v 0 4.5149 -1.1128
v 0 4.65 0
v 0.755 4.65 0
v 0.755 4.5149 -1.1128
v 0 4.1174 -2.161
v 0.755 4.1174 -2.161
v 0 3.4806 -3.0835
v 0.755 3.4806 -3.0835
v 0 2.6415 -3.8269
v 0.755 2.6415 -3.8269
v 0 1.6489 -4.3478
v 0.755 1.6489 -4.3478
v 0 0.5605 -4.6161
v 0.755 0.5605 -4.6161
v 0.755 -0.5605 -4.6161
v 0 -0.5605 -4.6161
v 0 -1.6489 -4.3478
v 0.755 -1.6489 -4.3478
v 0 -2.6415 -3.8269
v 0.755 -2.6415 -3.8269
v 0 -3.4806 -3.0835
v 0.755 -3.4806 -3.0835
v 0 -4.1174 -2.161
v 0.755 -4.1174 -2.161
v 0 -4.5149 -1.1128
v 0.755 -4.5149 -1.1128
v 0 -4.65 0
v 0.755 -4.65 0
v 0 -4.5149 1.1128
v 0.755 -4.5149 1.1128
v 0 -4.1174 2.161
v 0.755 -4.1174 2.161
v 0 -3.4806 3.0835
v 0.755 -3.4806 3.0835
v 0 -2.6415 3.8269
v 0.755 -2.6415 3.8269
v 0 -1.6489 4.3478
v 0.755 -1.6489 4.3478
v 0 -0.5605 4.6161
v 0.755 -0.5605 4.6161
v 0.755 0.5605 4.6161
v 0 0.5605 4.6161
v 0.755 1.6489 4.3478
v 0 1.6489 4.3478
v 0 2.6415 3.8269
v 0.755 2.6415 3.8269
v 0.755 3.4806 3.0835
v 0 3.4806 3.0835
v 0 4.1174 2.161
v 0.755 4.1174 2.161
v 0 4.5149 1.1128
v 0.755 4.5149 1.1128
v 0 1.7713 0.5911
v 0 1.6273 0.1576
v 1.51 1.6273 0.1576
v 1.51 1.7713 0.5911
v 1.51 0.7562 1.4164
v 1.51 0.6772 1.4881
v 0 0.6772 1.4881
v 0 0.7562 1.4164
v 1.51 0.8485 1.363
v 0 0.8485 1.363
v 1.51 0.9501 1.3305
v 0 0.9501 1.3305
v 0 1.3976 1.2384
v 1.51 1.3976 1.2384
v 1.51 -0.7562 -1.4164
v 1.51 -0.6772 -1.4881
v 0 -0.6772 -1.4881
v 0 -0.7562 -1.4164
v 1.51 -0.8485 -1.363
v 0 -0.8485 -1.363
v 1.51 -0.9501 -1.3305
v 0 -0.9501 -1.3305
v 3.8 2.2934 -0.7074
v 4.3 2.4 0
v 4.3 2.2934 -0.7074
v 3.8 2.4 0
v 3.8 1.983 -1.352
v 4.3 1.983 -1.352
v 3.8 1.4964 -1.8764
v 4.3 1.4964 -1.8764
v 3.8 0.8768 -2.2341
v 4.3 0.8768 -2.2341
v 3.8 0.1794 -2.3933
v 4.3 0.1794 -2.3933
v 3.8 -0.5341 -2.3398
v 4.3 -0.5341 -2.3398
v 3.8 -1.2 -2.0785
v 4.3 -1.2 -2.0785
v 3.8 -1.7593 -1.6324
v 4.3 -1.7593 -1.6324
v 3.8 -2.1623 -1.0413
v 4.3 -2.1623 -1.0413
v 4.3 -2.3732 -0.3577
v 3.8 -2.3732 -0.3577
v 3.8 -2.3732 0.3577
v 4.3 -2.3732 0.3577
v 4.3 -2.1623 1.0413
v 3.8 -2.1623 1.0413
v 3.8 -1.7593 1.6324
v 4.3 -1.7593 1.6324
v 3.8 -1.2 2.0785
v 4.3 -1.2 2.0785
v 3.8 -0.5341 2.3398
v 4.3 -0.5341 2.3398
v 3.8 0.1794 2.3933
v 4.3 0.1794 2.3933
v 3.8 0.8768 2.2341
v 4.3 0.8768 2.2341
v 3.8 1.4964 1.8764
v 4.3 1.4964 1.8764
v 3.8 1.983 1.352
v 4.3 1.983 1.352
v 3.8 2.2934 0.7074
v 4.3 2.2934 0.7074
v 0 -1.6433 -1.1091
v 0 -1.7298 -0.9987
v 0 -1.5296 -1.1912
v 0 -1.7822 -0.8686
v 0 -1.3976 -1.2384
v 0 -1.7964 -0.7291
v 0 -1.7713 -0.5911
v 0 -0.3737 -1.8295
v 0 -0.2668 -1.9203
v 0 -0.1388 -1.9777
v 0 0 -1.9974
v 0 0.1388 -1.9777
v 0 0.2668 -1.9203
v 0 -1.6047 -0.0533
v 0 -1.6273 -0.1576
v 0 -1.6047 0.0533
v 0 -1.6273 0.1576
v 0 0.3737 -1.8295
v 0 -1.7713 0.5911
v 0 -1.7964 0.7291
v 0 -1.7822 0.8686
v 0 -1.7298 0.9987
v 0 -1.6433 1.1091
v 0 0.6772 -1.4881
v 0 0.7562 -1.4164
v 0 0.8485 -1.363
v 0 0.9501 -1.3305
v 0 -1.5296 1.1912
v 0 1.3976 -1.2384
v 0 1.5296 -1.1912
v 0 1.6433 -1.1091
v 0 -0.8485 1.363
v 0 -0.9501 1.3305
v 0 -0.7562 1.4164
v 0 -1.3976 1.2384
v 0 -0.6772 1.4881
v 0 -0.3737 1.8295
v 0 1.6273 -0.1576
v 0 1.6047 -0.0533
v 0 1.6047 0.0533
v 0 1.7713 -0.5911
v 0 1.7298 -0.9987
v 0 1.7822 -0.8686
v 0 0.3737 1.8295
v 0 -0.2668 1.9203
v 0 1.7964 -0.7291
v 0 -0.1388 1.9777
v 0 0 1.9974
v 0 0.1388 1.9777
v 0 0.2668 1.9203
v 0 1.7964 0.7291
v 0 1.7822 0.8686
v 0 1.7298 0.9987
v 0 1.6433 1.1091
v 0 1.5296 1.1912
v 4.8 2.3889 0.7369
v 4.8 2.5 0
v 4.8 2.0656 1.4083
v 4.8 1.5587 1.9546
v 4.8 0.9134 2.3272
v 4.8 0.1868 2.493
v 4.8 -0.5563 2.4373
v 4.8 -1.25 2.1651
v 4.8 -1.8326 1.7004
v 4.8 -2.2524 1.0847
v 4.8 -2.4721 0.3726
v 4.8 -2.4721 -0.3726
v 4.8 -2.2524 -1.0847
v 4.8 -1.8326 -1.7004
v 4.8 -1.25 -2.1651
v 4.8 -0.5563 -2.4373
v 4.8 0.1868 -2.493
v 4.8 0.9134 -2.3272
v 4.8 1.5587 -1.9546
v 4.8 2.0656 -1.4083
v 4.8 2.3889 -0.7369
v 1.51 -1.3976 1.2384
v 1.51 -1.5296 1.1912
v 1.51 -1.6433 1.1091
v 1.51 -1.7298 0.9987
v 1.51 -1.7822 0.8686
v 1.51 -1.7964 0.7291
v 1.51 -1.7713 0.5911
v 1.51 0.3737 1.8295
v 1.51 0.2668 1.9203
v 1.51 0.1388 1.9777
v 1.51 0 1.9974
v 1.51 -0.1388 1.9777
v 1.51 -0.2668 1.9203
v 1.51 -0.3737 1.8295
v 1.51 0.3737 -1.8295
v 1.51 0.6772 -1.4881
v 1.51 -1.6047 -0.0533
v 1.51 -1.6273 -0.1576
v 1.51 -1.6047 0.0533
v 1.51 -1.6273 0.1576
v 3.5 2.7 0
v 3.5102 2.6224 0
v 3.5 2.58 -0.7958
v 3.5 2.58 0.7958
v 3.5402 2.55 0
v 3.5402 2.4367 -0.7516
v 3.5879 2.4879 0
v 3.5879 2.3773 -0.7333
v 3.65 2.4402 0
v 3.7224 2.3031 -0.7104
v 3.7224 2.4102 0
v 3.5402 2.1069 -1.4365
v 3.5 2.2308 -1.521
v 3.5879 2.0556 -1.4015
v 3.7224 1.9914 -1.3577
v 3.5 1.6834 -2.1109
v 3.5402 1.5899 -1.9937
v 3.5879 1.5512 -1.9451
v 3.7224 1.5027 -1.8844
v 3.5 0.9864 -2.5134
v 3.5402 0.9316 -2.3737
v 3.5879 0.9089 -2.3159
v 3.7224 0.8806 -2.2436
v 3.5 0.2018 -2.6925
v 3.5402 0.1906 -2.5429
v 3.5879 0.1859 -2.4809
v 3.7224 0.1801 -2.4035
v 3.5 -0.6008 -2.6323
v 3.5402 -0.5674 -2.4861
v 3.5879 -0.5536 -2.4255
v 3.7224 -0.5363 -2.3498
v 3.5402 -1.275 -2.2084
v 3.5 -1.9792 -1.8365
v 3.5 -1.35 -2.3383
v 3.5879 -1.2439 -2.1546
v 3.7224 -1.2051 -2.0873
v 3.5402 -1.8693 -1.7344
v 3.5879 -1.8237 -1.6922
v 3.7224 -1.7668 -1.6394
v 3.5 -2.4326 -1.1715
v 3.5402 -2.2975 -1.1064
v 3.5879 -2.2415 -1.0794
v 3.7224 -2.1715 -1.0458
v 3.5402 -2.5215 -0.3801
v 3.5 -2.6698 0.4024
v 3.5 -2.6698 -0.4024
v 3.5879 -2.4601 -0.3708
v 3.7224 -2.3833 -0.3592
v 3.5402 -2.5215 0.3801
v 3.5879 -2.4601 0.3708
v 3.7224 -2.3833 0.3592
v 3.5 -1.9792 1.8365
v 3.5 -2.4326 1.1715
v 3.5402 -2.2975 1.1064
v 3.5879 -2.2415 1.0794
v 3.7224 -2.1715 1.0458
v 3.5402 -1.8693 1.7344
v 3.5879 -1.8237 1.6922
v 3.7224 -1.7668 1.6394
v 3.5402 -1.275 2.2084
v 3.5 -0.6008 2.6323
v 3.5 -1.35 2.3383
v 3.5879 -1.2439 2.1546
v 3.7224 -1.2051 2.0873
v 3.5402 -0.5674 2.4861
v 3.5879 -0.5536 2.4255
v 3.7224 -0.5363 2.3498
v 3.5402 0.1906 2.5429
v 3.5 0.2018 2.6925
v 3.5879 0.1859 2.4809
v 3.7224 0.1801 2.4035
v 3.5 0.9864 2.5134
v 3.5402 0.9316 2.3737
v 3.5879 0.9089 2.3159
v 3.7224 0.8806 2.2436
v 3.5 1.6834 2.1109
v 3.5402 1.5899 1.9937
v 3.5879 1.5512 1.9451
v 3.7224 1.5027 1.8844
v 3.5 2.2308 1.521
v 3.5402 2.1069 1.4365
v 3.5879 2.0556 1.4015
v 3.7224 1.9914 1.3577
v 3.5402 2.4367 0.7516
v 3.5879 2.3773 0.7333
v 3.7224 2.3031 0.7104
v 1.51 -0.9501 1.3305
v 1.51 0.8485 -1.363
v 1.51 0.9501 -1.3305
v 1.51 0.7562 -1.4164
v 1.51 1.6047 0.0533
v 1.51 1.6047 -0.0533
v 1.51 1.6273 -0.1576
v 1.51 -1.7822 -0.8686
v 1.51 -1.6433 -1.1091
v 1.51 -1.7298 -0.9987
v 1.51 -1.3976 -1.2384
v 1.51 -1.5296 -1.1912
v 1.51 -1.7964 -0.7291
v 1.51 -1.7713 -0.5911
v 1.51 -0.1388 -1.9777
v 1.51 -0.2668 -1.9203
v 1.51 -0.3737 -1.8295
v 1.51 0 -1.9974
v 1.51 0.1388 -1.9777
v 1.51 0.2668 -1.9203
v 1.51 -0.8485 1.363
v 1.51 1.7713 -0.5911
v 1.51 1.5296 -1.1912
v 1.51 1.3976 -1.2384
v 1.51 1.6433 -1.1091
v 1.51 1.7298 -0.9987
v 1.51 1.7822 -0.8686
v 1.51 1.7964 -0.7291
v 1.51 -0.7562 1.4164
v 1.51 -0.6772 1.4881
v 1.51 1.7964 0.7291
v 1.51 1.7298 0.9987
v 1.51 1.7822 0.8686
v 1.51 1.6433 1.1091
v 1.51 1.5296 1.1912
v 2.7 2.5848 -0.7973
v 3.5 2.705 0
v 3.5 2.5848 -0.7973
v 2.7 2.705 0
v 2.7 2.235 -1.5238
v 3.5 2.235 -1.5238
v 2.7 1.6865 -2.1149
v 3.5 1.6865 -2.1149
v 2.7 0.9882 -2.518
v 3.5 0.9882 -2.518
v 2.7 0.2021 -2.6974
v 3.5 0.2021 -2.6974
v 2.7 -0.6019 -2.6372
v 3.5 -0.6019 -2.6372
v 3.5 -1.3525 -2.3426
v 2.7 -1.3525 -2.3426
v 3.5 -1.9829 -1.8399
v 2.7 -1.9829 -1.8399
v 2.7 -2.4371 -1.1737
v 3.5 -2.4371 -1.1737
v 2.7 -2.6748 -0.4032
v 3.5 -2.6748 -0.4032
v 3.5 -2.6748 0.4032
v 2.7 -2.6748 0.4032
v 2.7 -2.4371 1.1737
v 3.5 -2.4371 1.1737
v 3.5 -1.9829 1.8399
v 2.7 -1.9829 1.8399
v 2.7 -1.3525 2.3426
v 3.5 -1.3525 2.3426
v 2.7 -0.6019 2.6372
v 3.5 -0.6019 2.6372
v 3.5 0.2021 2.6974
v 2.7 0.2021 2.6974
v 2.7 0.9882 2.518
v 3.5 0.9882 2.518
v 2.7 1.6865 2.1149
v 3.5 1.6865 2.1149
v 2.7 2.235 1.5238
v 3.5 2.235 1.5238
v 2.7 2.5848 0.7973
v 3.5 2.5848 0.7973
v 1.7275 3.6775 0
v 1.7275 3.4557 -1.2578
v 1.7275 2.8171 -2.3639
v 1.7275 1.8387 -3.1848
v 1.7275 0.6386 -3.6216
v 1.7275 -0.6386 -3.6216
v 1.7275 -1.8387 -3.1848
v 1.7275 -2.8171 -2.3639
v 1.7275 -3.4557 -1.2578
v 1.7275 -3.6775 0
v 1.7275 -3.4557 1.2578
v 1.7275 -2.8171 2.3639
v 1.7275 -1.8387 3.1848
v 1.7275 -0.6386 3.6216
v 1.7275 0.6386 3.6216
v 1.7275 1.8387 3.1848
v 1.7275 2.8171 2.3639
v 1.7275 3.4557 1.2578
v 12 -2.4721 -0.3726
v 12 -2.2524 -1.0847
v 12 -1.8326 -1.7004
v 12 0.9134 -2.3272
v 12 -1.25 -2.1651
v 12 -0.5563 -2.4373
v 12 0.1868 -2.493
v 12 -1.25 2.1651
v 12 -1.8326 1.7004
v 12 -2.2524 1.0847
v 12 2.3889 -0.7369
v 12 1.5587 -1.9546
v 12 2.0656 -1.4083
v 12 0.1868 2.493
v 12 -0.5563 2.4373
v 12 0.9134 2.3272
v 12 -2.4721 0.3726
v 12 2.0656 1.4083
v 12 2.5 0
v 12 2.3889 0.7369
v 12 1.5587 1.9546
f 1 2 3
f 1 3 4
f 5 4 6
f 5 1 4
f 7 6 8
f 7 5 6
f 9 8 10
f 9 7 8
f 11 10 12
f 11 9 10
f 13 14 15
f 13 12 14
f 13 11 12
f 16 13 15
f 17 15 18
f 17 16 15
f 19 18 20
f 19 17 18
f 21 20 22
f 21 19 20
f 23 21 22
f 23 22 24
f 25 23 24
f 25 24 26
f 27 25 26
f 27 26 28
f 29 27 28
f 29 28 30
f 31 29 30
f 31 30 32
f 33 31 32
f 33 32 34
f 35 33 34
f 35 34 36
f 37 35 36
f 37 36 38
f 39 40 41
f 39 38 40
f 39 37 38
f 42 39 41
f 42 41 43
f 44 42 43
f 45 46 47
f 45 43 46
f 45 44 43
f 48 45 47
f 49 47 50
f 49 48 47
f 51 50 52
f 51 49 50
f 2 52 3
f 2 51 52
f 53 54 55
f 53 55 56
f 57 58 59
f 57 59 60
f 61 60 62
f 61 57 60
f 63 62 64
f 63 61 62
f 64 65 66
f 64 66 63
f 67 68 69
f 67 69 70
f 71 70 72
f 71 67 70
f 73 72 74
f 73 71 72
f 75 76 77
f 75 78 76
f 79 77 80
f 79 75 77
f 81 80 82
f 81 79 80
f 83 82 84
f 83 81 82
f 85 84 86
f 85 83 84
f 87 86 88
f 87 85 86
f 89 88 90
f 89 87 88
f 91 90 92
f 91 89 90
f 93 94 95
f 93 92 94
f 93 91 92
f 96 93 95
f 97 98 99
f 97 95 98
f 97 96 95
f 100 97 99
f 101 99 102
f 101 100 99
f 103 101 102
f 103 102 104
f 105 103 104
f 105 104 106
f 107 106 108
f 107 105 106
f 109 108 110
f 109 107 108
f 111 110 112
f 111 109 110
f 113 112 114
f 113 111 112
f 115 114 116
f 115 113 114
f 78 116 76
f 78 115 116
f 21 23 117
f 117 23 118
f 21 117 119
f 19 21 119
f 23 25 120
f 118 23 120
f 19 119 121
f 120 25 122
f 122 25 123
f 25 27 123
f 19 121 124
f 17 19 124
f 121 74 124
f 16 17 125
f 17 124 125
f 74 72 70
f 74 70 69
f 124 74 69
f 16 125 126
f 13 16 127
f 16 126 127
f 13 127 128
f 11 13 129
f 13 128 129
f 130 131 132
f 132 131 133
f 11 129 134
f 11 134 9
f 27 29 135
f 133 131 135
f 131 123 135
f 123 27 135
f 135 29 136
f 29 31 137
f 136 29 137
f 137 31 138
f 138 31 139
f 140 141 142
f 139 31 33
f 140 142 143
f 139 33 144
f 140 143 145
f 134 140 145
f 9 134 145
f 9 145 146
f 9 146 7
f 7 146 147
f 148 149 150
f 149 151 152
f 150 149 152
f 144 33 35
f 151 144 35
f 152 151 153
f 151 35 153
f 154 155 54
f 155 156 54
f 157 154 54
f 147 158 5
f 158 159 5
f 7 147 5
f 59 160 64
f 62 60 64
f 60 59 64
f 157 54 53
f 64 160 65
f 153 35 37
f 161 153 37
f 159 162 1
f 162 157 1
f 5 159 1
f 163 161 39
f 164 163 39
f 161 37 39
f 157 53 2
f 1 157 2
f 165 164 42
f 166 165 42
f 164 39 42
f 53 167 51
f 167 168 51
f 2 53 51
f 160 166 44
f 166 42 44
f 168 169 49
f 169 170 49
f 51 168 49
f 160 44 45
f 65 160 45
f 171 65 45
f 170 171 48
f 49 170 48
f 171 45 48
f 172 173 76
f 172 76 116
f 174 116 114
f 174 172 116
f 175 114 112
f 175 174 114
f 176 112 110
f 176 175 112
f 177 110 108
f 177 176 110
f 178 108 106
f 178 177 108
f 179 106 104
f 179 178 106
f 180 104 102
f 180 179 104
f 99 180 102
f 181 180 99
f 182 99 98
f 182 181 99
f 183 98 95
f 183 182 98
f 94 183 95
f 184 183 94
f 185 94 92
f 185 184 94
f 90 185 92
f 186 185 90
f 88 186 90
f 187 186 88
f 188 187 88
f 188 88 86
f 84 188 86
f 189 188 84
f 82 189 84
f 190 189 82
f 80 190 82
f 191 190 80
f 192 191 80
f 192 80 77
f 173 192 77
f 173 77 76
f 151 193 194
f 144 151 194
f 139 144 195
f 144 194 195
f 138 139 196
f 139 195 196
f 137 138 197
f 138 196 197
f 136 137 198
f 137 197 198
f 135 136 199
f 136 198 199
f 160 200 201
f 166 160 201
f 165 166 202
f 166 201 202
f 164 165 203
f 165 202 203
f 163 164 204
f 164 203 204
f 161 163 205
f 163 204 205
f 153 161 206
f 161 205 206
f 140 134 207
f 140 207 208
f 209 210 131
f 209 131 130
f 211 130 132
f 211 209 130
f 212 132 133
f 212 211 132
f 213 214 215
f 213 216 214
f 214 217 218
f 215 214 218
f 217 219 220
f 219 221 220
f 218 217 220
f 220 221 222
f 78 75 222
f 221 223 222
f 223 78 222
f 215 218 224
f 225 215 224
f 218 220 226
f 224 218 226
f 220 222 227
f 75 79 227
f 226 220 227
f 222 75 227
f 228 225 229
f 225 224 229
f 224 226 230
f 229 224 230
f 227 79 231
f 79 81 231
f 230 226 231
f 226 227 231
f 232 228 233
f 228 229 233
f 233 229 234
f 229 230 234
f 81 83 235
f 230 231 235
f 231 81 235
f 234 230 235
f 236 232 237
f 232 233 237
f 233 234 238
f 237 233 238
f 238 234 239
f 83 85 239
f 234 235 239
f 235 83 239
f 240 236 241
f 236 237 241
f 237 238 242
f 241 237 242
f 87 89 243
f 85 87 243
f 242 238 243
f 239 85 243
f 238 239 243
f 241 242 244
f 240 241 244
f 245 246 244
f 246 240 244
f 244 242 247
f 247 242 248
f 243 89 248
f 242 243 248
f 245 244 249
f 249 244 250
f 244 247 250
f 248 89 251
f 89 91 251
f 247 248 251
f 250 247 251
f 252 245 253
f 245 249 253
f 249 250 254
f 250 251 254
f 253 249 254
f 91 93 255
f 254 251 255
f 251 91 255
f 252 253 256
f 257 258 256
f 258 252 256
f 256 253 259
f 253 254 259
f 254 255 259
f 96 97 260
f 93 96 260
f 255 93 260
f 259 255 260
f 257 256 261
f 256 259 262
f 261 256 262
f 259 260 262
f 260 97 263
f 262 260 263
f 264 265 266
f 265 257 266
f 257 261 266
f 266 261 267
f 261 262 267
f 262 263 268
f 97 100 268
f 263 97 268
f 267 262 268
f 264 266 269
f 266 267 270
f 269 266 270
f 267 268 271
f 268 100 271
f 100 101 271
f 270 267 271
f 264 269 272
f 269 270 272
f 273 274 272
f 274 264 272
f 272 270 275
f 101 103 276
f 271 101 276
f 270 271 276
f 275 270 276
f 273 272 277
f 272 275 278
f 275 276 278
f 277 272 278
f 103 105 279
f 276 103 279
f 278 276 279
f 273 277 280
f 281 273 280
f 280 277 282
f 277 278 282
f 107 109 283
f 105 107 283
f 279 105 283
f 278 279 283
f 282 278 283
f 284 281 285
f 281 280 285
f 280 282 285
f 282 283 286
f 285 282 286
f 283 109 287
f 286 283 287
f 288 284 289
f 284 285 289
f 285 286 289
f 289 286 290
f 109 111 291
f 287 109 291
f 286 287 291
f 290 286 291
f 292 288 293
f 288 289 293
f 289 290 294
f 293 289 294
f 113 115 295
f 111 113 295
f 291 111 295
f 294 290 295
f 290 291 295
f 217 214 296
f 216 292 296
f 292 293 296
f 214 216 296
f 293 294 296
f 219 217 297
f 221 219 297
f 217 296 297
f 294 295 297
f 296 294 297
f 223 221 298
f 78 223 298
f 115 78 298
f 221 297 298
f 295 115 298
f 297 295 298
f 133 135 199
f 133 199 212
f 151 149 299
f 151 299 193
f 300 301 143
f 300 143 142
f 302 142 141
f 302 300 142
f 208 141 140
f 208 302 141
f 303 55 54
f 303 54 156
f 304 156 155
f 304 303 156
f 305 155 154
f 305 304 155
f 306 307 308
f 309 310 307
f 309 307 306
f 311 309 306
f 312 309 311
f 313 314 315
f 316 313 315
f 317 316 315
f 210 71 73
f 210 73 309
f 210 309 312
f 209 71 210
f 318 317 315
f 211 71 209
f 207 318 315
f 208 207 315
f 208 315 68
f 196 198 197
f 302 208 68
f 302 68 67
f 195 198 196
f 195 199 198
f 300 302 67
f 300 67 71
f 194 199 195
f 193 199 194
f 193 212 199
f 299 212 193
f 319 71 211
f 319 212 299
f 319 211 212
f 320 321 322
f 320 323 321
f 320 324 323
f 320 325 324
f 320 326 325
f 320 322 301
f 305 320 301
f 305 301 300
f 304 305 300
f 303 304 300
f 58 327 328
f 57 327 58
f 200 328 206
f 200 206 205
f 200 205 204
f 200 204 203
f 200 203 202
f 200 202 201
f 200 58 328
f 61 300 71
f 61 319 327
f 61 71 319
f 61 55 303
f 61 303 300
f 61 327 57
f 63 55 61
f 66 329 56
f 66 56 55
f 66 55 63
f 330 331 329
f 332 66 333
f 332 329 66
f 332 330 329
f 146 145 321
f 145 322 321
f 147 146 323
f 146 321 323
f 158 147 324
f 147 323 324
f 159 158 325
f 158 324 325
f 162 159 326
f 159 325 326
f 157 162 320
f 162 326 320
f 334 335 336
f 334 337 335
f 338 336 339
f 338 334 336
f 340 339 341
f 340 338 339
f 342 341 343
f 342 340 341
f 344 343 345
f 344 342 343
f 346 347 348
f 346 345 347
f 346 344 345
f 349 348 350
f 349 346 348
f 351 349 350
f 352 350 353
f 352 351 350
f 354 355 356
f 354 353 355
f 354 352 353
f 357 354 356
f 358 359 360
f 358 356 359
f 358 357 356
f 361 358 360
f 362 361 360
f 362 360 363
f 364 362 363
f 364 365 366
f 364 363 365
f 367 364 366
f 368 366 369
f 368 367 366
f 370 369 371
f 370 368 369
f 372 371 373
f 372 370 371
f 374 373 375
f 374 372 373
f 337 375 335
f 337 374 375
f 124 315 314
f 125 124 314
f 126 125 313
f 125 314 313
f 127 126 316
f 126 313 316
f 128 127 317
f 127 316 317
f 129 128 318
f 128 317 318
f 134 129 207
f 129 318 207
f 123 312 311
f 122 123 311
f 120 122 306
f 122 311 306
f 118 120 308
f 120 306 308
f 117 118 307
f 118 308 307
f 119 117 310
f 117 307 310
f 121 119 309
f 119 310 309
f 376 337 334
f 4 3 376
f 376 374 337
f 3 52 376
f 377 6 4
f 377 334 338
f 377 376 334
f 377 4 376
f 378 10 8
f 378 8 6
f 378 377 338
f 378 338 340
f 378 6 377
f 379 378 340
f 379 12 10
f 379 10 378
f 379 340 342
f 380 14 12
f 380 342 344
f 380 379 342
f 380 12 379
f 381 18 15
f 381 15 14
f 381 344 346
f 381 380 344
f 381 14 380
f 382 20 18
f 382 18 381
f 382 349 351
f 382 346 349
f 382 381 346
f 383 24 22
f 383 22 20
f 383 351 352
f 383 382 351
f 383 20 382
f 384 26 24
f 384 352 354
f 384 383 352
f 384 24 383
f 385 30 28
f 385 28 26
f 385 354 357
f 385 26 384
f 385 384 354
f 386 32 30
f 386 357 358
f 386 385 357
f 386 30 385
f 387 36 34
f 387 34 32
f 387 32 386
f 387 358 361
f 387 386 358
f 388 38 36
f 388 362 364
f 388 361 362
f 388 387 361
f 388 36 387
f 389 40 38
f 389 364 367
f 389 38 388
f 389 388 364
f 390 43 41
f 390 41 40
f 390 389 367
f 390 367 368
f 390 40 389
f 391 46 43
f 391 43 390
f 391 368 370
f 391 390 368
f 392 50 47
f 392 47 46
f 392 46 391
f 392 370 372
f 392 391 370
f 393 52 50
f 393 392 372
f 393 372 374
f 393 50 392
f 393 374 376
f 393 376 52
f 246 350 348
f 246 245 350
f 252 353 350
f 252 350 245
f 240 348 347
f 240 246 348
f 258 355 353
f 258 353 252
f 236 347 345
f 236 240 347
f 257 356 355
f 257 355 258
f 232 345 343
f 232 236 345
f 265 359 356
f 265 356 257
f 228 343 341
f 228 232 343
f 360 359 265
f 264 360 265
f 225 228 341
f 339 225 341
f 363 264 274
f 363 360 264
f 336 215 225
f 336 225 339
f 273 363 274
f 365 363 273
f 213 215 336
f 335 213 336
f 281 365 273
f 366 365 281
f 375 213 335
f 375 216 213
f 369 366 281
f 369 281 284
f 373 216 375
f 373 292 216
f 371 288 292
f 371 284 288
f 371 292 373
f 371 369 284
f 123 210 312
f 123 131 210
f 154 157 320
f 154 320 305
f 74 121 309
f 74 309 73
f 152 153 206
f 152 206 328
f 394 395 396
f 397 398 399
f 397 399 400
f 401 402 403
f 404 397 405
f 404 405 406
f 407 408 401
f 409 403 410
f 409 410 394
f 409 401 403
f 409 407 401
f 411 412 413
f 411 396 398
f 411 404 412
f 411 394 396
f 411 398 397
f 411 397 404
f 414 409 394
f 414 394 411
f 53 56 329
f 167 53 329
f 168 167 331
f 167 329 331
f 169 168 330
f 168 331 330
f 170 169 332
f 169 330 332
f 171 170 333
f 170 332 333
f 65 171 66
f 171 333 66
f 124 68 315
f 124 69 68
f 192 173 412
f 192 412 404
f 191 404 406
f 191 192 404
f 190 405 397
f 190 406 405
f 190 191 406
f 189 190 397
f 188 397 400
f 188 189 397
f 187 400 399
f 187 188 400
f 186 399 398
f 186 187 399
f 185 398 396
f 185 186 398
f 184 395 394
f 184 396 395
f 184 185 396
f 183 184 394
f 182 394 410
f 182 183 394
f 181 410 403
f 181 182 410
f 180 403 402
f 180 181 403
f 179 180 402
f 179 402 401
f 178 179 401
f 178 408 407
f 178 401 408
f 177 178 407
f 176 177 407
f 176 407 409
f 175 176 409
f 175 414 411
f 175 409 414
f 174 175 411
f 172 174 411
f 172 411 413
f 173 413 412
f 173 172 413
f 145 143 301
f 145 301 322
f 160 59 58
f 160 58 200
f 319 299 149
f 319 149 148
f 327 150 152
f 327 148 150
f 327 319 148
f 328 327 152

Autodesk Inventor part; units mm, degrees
ref_plane "YZ Plane" through (0, 0, 0) normal (1, 0, 0) x (0, 1, 0)
ref_plane "XZ Plane" through (0, 0, 0) normal (0, 1, 0) x (-1, 0, 0)
ref_plane "XY Plane" through (0, 0, 0) normal (0, 0, 1) x (1, 0, 0)
sketch "Sketch1" plane through (0, 0, 0) normal (0, 0, 1) x (1, 0, 0)
  line L0 (0, 0) -> (12, 0)
  line L1 (12, 0) -> (12, 2.5)
  line L2 (12, 2.5) -> (4.8, 2.5)
  line L3 (4.8, 2.5) -> (4.3, 2.4)
  line L4 (4.3, 2.4) -> (3.8, 2.4)
  line L5 (3.5, 2.705) -> (2.7, 2.705)
  line L6 (2.7, 2.705) -> (0.755, 4.65)
  line L7 (0.755, 4.65) -> (0, 4.65)
  line L8 (0, 4.65) -> (0, 0)
  line L9 (3.5, 2.705) -> (3.5, 2.7)
  arc A0 (3.5, 2.7) -> (3.8, 2.4) centre (3.8, 2.7) ccw
  dimension "d17" = 12
  dimension "d18" = 0.755
  dimension "d19" = 2.7
  dimension "d20" = 0.8
  dimension "d21" = 9.3
  dimension "d22" = 5
  dimension "d23" = 4.8
  dimension "d25" = 45
  dimension "d26" = 0.5
  dimension "d28" = 0.3
  dimension "d29" = 7.2
  dimension "d30" = 0.3
  dimension "d52" = 2.1
revolve "Revolution1" add sketch "Sketch1" angle 360 about axis through (0, 0, 0) along (1, 0, 0)
thread "Thread1" size "M5x0.8" class "6g" standard "ISO Metric profile" length 7.2
sketch "Sketch2" plane through (0, 0, 0) normal (-1, 0, 0) x (0, 0, 1)
  circle A0 centre (0, 0) radius 2.25 construction
  circle A1 centre (0, 0) radius 1.575 construction
  line L0 (0, 0) -> (1.364, 0.7875)
  line L1 (0, 0) -> (1.575, 0) construction
  line L2 (0, 0) -> (1.364, -0.7875)
  line L3 (0, 0) -> (1.575, 0) construction
  line L4 (1.364, 0.7875) -> (2.25, 0)
  line L5 (2.25, 0) -> (1.364, -0.7875)
  line L6 (-6.51, 0) -> (6.51, 0) projected
  dimension "d34" = 4.5
  dimension "d35" = 3.15
  dimension "d39" = 30
  dimension "d40" = 330
extrude "Extrusion1" cut sketch "Sketch2" against normal blind 1.51
pattern_circular "Circular Pattern1" count 6 over 360 about axis through (-10, 0, 0) along (1, 0, 0) of "Extrusion1"
fillet "Fillet1" radius 0.5 12 edges at (0.755, 0.7875, 1.364) (0.755, 0, 2.25) (0.755, -0.7875, 1.364) (0.755, -1.575, 0) (0.755, -1.9486, 1.125) (0.755, -1.9486, -1.125) (0.755, -0.7875, -1.364) (0.755, 0, -2.25) (0.755, 0.7875, -1.364) (0.755, 1.9486, -1.125) (0.755, 1.575, 0) (0.755, 1.9486, 1.125)
equation "\"d17\" = l_"
equation "\"d18\" = 0.5 * t"
equation "\"d19\" = k"
equation "\"d20\" = shldr"
equation "\"d21\" = dk"
equation "\"d22\" = d"
equation "\"d23\" = ds_"
equation "\"d25\" = 0.5 * headAngle"
equation "\"d26\" = x"
equation "\"d28\" = r"
equation "\"d29\" = b"
equation "\"d32\" = b"
equation "\"d34\" = A_"
equation "\"d35\" = 0.7 * A_"
equation "\"d43\" = t"
equation "\"d48\" = v"
equation "\"A_\" = 4.5"
equation "\"t\" = 1.51"
equation "\"v\" = 0.1 * d"
equation "\"dk\" = 9.3"
equation "\"k\" = 2.7"
equation "\"l_\" = 12"
equation "\"shldr\" = 0.8"
equation "\"d\" = 5"
equation "\"p\" = 0.8"
equation "\"x\" = 0.5"
equation "\"ds_\" = 0.96 * d"
equation "\"headAngle\" = 90deg"
equation "\"c_\" = 0.35 * v"
equation "\"r\" = 0.3"
equation "\"b\" = 7.2"
properties part number "Senkkopfschraube mit Innenrund ISO 14581 - M5x12-4.8" material "Stahl"
